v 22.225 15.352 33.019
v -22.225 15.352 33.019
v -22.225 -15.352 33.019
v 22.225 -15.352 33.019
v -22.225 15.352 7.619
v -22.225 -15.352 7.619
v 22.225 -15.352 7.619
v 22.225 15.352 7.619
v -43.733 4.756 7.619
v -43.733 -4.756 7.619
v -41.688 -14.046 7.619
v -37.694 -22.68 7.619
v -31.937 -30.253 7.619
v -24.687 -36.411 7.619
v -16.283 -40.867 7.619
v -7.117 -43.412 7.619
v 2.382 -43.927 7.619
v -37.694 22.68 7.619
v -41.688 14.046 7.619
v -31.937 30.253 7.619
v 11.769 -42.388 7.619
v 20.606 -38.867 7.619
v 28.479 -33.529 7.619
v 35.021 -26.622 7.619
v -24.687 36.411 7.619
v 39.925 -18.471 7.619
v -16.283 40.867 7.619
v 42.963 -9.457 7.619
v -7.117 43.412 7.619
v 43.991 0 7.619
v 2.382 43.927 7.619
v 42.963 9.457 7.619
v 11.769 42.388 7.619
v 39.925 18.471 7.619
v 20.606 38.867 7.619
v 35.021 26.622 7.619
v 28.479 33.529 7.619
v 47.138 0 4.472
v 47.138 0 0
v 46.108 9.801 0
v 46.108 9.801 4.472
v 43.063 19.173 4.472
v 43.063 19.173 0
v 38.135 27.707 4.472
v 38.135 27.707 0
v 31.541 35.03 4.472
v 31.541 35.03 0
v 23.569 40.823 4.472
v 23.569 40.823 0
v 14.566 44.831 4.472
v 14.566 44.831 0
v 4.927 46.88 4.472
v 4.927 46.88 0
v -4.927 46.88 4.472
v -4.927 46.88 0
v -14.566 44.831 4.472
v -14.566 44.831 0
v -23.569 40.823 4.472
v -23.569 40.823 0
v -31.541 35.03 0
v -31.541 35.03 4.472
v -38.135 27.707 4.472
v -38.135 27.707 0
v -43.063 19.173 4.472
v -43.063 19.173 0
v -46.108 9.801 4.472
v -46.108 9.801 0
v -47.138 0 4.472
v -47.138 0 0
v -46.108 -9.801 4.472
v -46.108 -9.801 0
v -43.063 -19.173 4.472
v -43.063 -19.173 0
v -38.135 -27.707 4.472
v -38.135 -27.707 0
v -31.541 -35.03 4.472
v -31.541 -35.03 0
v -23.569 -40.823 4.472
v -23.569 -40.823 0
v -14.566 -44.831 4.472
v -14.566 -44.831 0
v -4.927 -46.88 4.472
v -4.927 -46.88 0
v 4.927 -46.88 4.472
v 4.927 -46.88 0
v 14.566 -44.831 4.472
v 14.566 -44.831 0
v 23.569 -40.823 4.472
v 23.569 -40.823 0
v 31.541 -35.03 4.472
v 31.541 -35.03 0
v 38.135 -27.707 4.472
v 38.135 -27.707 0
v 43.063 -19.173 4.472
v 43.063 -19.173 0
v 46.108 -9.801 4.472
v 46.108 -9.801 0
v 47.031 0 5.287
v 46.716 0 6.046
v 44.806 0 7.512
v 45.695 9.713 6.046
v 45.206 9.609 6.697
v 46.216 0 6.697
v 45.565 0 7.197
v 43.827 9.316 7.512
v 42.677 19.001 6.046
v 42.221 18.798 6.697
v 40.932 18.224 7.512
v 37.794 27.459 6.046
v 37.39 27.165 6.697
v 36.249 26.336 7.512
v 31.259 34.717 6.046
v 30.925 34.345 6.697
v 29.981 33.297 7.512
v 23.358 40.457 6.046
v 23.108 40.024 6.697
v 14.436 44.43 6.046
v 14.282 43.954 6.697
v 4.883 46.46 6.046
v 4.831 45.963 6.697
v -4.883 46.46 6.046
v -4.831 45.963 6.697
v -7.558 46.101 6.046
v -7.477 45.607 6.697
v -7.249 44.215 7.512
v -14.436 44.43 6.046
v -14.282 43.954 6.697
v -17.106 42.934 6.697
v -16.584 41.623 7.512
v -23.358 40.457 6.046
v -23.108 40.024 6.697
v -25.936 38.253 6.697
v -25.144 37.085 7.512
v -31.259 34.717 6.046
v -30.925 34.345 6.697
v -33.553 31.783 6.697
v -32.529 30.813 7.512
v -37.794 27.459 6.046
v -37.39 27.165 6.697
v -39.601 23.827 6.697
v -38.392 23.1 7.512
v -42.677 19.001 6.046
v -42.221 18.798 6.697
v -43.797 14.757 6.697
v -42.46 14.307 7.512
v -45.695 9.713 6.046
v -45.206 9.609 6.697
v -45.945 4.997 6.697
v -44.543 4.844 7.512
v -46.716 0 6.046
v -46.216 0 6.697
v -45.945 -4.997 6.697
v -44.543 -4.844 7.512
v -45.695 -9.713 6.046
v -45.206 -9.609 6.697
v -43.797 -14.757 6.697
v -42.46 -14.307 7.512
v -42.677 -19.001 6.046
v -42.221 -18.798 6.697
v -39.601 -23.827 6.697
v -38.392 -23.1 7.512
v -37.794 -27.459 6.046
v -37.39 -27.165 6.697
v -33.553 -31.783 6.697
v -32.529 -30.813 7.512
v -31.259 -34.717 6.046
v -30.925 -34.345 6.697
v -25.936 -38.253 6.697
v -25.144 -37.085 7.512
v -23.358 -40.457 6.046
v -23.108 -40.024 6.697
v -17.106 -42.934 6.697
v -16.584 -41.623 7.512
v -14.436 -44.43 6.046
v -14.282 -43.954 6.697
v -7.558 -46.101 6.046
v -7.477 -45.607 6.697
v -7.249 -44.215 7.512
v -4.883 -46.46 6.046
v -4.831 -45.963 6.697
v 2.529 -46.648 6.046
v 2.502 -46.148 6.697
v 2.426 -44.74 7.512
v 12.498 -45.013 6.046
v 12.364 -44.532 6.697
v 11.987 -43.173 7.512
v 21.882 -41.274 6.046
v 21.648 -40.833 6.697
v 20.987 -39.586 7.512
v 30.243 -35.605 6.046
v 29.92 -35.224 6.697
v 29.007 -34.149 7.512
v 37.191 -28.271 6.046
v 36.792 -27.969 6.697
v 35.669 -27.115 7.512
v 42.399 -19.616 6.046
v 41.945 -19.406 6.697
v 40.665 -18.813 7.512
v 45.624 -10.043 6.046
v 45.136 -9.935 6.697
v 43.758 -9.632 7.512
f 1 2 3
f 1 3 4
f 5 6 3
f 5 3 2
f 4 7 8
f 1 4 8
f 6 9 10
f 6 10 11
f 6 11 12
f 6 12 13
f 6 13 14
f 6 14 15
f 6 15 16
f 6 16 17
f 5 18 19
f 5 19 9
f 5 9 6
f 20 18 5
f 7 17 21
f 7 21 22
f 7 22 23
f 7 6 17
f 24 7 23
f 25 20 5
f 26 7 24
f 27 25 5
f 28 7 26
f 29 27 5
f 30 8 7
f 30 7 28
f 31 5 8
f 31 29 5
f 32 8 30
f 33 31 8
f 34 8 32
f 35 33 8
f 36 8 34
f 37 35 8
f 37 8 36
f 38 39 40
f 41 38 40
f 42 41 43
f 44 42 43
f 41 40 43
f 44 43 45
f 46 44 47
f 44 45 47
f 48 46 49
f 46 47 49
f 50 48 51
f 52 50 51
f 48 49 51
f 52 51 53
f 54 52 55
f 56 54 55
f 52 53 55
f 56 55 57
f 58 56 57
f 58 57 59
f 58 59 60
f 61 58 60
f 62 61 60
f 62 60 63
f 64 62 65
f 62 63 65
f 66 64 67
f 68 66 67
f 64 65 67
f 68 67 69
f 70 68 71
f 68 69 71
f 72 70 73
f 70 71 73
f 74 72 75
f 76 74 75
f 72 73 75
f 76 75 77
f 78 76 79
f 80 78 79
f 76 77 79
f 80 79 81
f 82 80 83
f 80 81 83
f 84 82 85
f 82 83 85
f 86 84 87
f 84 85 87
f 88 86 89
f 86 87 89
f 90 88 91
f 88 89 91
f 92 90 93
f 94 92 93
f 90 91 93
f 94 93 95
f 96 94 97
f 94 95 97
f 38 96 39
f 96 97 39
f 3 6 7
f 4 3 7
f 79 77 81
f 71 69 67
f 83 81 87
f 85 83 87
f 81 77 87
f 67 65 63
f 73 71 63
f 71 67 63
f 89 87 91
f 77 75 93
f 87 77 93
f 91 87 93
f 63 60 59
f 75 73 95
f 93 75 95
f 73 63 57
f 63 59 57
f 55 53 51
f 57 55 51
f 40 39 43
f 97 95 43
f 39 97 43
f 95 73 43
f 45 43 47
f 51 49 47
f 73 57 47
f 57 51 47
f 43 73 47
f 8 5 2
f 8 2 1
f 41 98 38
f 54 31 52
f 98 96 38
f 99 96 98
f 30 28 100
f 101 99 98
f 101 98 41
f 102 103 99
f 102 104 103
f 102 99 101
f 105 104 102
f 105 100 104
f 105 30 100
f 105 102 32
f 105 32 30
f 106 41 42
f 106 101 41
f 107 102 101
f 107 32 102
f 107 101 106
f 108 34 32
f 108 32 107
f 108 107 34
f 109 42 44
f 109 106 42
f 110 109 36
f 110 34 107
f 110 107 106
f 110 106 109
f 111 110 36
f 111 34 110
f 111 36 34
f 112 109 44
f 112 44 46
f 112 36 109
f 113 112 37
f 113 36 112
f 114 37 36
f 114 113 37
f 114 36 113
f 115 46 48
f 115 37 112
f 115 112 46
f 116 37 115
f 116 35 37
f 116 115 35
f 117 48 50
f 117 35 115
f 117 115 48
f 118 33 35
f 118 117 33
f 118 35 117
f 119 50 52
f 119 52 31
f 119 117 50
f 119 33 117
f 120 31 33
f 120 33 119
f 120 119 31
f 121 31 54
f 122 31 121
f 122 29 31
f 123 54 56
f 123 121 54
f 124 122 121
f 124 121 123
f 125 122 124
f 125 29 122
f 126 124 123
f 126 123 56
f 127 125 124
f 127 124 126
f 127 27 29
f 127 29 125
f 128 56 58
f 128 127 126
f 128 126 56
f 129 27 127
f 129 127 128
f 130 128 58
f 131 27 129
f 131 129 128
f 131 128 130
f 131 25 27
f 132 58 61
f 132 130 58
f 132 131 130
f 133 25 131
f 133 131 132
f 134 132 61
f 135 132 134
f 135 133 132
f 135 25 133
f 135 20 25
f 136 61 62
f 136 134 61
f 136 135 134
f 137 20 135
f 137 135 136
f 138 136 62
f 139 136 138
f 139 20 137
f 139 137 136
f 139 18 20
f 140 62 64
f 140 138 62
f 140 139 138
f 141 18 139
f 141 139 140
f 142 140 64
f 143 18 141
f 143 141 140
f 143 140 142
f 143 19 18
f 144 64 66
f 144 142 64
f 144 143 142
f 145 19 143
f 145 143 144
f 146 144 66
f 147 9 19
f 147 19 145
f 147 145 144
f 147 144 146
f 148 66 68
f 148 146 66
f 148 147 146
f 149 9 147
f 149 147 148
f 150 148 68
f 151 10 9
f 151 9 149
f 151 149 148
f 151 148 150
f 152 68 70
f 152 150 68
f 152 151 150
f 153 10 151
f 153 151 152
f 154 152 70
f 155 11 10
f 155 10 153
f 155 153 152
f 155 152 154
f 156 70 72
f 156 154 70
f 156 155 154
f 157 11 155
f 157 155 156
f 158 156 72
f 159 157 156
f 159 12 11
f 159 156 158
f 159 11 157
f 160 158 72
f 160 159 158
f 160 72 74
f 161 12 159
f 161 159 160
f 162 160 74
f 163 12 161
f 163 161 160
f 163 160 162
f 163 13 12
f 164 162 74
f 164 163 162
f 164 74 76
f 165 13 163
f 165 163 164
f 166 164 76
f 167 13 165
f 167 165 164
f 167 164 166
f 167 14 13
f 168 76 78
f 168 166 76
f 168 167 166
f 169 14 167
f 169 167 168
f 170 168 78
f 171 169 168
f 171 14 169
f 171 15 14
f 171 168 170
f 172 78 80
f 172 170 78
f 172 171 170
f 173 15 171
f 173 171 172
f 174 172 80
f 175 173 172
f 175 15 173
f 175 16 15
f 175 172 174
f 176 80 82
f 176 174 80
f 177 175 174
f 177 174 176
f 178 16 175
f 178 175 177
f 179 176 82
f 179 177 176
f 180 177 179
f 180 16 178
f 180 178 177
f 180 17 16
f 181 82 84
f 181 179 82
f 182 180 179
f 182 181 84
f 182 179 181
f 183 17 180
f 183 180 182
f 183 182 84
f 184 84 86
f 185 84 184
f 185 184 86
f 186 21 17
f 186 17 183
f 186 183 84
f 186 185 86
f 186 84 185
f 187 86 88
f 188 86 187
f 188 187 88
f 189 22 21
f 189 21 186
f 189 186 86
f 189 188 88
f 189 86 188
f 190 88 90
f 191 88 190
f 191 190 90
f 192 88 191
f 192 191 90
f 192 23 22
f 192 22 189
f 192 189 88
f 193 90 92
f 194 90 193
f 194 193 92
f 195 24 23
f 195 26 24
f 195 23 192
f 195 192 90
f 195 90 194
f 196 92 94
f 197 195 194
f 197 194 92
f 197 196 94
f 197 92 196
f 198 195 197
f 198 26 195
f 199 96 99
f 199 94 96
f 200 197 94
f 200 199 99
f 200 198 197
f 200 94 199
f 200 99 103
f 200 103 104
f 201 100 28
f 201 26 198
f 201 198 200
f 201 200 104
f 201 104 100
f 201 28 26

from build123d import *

# Parameters (mm, degrees)
F0_R     = 47.137845
F1_DEPTH = 7.61904
F2_R     = 3.146541
F4_W     = 44.450962
F4_H     = 30.703868
F5_DEPTH = 25.4


with BuildPart() as f1:
    # F0 (on Top) → F1 (new body)
    with BuildSketch(Plane.XY):
        Circle(F0_R)
    extrude(amount=F1_DEPTH)

    # F2
    f2_edges = [f1.edges().sort_by_distance(p)[0] for p in [
        (-47.137845, 0, 7.61904),
    ]]
    fillet(f2_edges, radius=F2_R)

    # F4 (on face) → F5 (join)
    with BuildSketch(Plane.XY.offset(7.61904)):
        Rectangle(F4_W, F4_H)
    extrude(amount=F5_DEPTH)


solid = f1.part
